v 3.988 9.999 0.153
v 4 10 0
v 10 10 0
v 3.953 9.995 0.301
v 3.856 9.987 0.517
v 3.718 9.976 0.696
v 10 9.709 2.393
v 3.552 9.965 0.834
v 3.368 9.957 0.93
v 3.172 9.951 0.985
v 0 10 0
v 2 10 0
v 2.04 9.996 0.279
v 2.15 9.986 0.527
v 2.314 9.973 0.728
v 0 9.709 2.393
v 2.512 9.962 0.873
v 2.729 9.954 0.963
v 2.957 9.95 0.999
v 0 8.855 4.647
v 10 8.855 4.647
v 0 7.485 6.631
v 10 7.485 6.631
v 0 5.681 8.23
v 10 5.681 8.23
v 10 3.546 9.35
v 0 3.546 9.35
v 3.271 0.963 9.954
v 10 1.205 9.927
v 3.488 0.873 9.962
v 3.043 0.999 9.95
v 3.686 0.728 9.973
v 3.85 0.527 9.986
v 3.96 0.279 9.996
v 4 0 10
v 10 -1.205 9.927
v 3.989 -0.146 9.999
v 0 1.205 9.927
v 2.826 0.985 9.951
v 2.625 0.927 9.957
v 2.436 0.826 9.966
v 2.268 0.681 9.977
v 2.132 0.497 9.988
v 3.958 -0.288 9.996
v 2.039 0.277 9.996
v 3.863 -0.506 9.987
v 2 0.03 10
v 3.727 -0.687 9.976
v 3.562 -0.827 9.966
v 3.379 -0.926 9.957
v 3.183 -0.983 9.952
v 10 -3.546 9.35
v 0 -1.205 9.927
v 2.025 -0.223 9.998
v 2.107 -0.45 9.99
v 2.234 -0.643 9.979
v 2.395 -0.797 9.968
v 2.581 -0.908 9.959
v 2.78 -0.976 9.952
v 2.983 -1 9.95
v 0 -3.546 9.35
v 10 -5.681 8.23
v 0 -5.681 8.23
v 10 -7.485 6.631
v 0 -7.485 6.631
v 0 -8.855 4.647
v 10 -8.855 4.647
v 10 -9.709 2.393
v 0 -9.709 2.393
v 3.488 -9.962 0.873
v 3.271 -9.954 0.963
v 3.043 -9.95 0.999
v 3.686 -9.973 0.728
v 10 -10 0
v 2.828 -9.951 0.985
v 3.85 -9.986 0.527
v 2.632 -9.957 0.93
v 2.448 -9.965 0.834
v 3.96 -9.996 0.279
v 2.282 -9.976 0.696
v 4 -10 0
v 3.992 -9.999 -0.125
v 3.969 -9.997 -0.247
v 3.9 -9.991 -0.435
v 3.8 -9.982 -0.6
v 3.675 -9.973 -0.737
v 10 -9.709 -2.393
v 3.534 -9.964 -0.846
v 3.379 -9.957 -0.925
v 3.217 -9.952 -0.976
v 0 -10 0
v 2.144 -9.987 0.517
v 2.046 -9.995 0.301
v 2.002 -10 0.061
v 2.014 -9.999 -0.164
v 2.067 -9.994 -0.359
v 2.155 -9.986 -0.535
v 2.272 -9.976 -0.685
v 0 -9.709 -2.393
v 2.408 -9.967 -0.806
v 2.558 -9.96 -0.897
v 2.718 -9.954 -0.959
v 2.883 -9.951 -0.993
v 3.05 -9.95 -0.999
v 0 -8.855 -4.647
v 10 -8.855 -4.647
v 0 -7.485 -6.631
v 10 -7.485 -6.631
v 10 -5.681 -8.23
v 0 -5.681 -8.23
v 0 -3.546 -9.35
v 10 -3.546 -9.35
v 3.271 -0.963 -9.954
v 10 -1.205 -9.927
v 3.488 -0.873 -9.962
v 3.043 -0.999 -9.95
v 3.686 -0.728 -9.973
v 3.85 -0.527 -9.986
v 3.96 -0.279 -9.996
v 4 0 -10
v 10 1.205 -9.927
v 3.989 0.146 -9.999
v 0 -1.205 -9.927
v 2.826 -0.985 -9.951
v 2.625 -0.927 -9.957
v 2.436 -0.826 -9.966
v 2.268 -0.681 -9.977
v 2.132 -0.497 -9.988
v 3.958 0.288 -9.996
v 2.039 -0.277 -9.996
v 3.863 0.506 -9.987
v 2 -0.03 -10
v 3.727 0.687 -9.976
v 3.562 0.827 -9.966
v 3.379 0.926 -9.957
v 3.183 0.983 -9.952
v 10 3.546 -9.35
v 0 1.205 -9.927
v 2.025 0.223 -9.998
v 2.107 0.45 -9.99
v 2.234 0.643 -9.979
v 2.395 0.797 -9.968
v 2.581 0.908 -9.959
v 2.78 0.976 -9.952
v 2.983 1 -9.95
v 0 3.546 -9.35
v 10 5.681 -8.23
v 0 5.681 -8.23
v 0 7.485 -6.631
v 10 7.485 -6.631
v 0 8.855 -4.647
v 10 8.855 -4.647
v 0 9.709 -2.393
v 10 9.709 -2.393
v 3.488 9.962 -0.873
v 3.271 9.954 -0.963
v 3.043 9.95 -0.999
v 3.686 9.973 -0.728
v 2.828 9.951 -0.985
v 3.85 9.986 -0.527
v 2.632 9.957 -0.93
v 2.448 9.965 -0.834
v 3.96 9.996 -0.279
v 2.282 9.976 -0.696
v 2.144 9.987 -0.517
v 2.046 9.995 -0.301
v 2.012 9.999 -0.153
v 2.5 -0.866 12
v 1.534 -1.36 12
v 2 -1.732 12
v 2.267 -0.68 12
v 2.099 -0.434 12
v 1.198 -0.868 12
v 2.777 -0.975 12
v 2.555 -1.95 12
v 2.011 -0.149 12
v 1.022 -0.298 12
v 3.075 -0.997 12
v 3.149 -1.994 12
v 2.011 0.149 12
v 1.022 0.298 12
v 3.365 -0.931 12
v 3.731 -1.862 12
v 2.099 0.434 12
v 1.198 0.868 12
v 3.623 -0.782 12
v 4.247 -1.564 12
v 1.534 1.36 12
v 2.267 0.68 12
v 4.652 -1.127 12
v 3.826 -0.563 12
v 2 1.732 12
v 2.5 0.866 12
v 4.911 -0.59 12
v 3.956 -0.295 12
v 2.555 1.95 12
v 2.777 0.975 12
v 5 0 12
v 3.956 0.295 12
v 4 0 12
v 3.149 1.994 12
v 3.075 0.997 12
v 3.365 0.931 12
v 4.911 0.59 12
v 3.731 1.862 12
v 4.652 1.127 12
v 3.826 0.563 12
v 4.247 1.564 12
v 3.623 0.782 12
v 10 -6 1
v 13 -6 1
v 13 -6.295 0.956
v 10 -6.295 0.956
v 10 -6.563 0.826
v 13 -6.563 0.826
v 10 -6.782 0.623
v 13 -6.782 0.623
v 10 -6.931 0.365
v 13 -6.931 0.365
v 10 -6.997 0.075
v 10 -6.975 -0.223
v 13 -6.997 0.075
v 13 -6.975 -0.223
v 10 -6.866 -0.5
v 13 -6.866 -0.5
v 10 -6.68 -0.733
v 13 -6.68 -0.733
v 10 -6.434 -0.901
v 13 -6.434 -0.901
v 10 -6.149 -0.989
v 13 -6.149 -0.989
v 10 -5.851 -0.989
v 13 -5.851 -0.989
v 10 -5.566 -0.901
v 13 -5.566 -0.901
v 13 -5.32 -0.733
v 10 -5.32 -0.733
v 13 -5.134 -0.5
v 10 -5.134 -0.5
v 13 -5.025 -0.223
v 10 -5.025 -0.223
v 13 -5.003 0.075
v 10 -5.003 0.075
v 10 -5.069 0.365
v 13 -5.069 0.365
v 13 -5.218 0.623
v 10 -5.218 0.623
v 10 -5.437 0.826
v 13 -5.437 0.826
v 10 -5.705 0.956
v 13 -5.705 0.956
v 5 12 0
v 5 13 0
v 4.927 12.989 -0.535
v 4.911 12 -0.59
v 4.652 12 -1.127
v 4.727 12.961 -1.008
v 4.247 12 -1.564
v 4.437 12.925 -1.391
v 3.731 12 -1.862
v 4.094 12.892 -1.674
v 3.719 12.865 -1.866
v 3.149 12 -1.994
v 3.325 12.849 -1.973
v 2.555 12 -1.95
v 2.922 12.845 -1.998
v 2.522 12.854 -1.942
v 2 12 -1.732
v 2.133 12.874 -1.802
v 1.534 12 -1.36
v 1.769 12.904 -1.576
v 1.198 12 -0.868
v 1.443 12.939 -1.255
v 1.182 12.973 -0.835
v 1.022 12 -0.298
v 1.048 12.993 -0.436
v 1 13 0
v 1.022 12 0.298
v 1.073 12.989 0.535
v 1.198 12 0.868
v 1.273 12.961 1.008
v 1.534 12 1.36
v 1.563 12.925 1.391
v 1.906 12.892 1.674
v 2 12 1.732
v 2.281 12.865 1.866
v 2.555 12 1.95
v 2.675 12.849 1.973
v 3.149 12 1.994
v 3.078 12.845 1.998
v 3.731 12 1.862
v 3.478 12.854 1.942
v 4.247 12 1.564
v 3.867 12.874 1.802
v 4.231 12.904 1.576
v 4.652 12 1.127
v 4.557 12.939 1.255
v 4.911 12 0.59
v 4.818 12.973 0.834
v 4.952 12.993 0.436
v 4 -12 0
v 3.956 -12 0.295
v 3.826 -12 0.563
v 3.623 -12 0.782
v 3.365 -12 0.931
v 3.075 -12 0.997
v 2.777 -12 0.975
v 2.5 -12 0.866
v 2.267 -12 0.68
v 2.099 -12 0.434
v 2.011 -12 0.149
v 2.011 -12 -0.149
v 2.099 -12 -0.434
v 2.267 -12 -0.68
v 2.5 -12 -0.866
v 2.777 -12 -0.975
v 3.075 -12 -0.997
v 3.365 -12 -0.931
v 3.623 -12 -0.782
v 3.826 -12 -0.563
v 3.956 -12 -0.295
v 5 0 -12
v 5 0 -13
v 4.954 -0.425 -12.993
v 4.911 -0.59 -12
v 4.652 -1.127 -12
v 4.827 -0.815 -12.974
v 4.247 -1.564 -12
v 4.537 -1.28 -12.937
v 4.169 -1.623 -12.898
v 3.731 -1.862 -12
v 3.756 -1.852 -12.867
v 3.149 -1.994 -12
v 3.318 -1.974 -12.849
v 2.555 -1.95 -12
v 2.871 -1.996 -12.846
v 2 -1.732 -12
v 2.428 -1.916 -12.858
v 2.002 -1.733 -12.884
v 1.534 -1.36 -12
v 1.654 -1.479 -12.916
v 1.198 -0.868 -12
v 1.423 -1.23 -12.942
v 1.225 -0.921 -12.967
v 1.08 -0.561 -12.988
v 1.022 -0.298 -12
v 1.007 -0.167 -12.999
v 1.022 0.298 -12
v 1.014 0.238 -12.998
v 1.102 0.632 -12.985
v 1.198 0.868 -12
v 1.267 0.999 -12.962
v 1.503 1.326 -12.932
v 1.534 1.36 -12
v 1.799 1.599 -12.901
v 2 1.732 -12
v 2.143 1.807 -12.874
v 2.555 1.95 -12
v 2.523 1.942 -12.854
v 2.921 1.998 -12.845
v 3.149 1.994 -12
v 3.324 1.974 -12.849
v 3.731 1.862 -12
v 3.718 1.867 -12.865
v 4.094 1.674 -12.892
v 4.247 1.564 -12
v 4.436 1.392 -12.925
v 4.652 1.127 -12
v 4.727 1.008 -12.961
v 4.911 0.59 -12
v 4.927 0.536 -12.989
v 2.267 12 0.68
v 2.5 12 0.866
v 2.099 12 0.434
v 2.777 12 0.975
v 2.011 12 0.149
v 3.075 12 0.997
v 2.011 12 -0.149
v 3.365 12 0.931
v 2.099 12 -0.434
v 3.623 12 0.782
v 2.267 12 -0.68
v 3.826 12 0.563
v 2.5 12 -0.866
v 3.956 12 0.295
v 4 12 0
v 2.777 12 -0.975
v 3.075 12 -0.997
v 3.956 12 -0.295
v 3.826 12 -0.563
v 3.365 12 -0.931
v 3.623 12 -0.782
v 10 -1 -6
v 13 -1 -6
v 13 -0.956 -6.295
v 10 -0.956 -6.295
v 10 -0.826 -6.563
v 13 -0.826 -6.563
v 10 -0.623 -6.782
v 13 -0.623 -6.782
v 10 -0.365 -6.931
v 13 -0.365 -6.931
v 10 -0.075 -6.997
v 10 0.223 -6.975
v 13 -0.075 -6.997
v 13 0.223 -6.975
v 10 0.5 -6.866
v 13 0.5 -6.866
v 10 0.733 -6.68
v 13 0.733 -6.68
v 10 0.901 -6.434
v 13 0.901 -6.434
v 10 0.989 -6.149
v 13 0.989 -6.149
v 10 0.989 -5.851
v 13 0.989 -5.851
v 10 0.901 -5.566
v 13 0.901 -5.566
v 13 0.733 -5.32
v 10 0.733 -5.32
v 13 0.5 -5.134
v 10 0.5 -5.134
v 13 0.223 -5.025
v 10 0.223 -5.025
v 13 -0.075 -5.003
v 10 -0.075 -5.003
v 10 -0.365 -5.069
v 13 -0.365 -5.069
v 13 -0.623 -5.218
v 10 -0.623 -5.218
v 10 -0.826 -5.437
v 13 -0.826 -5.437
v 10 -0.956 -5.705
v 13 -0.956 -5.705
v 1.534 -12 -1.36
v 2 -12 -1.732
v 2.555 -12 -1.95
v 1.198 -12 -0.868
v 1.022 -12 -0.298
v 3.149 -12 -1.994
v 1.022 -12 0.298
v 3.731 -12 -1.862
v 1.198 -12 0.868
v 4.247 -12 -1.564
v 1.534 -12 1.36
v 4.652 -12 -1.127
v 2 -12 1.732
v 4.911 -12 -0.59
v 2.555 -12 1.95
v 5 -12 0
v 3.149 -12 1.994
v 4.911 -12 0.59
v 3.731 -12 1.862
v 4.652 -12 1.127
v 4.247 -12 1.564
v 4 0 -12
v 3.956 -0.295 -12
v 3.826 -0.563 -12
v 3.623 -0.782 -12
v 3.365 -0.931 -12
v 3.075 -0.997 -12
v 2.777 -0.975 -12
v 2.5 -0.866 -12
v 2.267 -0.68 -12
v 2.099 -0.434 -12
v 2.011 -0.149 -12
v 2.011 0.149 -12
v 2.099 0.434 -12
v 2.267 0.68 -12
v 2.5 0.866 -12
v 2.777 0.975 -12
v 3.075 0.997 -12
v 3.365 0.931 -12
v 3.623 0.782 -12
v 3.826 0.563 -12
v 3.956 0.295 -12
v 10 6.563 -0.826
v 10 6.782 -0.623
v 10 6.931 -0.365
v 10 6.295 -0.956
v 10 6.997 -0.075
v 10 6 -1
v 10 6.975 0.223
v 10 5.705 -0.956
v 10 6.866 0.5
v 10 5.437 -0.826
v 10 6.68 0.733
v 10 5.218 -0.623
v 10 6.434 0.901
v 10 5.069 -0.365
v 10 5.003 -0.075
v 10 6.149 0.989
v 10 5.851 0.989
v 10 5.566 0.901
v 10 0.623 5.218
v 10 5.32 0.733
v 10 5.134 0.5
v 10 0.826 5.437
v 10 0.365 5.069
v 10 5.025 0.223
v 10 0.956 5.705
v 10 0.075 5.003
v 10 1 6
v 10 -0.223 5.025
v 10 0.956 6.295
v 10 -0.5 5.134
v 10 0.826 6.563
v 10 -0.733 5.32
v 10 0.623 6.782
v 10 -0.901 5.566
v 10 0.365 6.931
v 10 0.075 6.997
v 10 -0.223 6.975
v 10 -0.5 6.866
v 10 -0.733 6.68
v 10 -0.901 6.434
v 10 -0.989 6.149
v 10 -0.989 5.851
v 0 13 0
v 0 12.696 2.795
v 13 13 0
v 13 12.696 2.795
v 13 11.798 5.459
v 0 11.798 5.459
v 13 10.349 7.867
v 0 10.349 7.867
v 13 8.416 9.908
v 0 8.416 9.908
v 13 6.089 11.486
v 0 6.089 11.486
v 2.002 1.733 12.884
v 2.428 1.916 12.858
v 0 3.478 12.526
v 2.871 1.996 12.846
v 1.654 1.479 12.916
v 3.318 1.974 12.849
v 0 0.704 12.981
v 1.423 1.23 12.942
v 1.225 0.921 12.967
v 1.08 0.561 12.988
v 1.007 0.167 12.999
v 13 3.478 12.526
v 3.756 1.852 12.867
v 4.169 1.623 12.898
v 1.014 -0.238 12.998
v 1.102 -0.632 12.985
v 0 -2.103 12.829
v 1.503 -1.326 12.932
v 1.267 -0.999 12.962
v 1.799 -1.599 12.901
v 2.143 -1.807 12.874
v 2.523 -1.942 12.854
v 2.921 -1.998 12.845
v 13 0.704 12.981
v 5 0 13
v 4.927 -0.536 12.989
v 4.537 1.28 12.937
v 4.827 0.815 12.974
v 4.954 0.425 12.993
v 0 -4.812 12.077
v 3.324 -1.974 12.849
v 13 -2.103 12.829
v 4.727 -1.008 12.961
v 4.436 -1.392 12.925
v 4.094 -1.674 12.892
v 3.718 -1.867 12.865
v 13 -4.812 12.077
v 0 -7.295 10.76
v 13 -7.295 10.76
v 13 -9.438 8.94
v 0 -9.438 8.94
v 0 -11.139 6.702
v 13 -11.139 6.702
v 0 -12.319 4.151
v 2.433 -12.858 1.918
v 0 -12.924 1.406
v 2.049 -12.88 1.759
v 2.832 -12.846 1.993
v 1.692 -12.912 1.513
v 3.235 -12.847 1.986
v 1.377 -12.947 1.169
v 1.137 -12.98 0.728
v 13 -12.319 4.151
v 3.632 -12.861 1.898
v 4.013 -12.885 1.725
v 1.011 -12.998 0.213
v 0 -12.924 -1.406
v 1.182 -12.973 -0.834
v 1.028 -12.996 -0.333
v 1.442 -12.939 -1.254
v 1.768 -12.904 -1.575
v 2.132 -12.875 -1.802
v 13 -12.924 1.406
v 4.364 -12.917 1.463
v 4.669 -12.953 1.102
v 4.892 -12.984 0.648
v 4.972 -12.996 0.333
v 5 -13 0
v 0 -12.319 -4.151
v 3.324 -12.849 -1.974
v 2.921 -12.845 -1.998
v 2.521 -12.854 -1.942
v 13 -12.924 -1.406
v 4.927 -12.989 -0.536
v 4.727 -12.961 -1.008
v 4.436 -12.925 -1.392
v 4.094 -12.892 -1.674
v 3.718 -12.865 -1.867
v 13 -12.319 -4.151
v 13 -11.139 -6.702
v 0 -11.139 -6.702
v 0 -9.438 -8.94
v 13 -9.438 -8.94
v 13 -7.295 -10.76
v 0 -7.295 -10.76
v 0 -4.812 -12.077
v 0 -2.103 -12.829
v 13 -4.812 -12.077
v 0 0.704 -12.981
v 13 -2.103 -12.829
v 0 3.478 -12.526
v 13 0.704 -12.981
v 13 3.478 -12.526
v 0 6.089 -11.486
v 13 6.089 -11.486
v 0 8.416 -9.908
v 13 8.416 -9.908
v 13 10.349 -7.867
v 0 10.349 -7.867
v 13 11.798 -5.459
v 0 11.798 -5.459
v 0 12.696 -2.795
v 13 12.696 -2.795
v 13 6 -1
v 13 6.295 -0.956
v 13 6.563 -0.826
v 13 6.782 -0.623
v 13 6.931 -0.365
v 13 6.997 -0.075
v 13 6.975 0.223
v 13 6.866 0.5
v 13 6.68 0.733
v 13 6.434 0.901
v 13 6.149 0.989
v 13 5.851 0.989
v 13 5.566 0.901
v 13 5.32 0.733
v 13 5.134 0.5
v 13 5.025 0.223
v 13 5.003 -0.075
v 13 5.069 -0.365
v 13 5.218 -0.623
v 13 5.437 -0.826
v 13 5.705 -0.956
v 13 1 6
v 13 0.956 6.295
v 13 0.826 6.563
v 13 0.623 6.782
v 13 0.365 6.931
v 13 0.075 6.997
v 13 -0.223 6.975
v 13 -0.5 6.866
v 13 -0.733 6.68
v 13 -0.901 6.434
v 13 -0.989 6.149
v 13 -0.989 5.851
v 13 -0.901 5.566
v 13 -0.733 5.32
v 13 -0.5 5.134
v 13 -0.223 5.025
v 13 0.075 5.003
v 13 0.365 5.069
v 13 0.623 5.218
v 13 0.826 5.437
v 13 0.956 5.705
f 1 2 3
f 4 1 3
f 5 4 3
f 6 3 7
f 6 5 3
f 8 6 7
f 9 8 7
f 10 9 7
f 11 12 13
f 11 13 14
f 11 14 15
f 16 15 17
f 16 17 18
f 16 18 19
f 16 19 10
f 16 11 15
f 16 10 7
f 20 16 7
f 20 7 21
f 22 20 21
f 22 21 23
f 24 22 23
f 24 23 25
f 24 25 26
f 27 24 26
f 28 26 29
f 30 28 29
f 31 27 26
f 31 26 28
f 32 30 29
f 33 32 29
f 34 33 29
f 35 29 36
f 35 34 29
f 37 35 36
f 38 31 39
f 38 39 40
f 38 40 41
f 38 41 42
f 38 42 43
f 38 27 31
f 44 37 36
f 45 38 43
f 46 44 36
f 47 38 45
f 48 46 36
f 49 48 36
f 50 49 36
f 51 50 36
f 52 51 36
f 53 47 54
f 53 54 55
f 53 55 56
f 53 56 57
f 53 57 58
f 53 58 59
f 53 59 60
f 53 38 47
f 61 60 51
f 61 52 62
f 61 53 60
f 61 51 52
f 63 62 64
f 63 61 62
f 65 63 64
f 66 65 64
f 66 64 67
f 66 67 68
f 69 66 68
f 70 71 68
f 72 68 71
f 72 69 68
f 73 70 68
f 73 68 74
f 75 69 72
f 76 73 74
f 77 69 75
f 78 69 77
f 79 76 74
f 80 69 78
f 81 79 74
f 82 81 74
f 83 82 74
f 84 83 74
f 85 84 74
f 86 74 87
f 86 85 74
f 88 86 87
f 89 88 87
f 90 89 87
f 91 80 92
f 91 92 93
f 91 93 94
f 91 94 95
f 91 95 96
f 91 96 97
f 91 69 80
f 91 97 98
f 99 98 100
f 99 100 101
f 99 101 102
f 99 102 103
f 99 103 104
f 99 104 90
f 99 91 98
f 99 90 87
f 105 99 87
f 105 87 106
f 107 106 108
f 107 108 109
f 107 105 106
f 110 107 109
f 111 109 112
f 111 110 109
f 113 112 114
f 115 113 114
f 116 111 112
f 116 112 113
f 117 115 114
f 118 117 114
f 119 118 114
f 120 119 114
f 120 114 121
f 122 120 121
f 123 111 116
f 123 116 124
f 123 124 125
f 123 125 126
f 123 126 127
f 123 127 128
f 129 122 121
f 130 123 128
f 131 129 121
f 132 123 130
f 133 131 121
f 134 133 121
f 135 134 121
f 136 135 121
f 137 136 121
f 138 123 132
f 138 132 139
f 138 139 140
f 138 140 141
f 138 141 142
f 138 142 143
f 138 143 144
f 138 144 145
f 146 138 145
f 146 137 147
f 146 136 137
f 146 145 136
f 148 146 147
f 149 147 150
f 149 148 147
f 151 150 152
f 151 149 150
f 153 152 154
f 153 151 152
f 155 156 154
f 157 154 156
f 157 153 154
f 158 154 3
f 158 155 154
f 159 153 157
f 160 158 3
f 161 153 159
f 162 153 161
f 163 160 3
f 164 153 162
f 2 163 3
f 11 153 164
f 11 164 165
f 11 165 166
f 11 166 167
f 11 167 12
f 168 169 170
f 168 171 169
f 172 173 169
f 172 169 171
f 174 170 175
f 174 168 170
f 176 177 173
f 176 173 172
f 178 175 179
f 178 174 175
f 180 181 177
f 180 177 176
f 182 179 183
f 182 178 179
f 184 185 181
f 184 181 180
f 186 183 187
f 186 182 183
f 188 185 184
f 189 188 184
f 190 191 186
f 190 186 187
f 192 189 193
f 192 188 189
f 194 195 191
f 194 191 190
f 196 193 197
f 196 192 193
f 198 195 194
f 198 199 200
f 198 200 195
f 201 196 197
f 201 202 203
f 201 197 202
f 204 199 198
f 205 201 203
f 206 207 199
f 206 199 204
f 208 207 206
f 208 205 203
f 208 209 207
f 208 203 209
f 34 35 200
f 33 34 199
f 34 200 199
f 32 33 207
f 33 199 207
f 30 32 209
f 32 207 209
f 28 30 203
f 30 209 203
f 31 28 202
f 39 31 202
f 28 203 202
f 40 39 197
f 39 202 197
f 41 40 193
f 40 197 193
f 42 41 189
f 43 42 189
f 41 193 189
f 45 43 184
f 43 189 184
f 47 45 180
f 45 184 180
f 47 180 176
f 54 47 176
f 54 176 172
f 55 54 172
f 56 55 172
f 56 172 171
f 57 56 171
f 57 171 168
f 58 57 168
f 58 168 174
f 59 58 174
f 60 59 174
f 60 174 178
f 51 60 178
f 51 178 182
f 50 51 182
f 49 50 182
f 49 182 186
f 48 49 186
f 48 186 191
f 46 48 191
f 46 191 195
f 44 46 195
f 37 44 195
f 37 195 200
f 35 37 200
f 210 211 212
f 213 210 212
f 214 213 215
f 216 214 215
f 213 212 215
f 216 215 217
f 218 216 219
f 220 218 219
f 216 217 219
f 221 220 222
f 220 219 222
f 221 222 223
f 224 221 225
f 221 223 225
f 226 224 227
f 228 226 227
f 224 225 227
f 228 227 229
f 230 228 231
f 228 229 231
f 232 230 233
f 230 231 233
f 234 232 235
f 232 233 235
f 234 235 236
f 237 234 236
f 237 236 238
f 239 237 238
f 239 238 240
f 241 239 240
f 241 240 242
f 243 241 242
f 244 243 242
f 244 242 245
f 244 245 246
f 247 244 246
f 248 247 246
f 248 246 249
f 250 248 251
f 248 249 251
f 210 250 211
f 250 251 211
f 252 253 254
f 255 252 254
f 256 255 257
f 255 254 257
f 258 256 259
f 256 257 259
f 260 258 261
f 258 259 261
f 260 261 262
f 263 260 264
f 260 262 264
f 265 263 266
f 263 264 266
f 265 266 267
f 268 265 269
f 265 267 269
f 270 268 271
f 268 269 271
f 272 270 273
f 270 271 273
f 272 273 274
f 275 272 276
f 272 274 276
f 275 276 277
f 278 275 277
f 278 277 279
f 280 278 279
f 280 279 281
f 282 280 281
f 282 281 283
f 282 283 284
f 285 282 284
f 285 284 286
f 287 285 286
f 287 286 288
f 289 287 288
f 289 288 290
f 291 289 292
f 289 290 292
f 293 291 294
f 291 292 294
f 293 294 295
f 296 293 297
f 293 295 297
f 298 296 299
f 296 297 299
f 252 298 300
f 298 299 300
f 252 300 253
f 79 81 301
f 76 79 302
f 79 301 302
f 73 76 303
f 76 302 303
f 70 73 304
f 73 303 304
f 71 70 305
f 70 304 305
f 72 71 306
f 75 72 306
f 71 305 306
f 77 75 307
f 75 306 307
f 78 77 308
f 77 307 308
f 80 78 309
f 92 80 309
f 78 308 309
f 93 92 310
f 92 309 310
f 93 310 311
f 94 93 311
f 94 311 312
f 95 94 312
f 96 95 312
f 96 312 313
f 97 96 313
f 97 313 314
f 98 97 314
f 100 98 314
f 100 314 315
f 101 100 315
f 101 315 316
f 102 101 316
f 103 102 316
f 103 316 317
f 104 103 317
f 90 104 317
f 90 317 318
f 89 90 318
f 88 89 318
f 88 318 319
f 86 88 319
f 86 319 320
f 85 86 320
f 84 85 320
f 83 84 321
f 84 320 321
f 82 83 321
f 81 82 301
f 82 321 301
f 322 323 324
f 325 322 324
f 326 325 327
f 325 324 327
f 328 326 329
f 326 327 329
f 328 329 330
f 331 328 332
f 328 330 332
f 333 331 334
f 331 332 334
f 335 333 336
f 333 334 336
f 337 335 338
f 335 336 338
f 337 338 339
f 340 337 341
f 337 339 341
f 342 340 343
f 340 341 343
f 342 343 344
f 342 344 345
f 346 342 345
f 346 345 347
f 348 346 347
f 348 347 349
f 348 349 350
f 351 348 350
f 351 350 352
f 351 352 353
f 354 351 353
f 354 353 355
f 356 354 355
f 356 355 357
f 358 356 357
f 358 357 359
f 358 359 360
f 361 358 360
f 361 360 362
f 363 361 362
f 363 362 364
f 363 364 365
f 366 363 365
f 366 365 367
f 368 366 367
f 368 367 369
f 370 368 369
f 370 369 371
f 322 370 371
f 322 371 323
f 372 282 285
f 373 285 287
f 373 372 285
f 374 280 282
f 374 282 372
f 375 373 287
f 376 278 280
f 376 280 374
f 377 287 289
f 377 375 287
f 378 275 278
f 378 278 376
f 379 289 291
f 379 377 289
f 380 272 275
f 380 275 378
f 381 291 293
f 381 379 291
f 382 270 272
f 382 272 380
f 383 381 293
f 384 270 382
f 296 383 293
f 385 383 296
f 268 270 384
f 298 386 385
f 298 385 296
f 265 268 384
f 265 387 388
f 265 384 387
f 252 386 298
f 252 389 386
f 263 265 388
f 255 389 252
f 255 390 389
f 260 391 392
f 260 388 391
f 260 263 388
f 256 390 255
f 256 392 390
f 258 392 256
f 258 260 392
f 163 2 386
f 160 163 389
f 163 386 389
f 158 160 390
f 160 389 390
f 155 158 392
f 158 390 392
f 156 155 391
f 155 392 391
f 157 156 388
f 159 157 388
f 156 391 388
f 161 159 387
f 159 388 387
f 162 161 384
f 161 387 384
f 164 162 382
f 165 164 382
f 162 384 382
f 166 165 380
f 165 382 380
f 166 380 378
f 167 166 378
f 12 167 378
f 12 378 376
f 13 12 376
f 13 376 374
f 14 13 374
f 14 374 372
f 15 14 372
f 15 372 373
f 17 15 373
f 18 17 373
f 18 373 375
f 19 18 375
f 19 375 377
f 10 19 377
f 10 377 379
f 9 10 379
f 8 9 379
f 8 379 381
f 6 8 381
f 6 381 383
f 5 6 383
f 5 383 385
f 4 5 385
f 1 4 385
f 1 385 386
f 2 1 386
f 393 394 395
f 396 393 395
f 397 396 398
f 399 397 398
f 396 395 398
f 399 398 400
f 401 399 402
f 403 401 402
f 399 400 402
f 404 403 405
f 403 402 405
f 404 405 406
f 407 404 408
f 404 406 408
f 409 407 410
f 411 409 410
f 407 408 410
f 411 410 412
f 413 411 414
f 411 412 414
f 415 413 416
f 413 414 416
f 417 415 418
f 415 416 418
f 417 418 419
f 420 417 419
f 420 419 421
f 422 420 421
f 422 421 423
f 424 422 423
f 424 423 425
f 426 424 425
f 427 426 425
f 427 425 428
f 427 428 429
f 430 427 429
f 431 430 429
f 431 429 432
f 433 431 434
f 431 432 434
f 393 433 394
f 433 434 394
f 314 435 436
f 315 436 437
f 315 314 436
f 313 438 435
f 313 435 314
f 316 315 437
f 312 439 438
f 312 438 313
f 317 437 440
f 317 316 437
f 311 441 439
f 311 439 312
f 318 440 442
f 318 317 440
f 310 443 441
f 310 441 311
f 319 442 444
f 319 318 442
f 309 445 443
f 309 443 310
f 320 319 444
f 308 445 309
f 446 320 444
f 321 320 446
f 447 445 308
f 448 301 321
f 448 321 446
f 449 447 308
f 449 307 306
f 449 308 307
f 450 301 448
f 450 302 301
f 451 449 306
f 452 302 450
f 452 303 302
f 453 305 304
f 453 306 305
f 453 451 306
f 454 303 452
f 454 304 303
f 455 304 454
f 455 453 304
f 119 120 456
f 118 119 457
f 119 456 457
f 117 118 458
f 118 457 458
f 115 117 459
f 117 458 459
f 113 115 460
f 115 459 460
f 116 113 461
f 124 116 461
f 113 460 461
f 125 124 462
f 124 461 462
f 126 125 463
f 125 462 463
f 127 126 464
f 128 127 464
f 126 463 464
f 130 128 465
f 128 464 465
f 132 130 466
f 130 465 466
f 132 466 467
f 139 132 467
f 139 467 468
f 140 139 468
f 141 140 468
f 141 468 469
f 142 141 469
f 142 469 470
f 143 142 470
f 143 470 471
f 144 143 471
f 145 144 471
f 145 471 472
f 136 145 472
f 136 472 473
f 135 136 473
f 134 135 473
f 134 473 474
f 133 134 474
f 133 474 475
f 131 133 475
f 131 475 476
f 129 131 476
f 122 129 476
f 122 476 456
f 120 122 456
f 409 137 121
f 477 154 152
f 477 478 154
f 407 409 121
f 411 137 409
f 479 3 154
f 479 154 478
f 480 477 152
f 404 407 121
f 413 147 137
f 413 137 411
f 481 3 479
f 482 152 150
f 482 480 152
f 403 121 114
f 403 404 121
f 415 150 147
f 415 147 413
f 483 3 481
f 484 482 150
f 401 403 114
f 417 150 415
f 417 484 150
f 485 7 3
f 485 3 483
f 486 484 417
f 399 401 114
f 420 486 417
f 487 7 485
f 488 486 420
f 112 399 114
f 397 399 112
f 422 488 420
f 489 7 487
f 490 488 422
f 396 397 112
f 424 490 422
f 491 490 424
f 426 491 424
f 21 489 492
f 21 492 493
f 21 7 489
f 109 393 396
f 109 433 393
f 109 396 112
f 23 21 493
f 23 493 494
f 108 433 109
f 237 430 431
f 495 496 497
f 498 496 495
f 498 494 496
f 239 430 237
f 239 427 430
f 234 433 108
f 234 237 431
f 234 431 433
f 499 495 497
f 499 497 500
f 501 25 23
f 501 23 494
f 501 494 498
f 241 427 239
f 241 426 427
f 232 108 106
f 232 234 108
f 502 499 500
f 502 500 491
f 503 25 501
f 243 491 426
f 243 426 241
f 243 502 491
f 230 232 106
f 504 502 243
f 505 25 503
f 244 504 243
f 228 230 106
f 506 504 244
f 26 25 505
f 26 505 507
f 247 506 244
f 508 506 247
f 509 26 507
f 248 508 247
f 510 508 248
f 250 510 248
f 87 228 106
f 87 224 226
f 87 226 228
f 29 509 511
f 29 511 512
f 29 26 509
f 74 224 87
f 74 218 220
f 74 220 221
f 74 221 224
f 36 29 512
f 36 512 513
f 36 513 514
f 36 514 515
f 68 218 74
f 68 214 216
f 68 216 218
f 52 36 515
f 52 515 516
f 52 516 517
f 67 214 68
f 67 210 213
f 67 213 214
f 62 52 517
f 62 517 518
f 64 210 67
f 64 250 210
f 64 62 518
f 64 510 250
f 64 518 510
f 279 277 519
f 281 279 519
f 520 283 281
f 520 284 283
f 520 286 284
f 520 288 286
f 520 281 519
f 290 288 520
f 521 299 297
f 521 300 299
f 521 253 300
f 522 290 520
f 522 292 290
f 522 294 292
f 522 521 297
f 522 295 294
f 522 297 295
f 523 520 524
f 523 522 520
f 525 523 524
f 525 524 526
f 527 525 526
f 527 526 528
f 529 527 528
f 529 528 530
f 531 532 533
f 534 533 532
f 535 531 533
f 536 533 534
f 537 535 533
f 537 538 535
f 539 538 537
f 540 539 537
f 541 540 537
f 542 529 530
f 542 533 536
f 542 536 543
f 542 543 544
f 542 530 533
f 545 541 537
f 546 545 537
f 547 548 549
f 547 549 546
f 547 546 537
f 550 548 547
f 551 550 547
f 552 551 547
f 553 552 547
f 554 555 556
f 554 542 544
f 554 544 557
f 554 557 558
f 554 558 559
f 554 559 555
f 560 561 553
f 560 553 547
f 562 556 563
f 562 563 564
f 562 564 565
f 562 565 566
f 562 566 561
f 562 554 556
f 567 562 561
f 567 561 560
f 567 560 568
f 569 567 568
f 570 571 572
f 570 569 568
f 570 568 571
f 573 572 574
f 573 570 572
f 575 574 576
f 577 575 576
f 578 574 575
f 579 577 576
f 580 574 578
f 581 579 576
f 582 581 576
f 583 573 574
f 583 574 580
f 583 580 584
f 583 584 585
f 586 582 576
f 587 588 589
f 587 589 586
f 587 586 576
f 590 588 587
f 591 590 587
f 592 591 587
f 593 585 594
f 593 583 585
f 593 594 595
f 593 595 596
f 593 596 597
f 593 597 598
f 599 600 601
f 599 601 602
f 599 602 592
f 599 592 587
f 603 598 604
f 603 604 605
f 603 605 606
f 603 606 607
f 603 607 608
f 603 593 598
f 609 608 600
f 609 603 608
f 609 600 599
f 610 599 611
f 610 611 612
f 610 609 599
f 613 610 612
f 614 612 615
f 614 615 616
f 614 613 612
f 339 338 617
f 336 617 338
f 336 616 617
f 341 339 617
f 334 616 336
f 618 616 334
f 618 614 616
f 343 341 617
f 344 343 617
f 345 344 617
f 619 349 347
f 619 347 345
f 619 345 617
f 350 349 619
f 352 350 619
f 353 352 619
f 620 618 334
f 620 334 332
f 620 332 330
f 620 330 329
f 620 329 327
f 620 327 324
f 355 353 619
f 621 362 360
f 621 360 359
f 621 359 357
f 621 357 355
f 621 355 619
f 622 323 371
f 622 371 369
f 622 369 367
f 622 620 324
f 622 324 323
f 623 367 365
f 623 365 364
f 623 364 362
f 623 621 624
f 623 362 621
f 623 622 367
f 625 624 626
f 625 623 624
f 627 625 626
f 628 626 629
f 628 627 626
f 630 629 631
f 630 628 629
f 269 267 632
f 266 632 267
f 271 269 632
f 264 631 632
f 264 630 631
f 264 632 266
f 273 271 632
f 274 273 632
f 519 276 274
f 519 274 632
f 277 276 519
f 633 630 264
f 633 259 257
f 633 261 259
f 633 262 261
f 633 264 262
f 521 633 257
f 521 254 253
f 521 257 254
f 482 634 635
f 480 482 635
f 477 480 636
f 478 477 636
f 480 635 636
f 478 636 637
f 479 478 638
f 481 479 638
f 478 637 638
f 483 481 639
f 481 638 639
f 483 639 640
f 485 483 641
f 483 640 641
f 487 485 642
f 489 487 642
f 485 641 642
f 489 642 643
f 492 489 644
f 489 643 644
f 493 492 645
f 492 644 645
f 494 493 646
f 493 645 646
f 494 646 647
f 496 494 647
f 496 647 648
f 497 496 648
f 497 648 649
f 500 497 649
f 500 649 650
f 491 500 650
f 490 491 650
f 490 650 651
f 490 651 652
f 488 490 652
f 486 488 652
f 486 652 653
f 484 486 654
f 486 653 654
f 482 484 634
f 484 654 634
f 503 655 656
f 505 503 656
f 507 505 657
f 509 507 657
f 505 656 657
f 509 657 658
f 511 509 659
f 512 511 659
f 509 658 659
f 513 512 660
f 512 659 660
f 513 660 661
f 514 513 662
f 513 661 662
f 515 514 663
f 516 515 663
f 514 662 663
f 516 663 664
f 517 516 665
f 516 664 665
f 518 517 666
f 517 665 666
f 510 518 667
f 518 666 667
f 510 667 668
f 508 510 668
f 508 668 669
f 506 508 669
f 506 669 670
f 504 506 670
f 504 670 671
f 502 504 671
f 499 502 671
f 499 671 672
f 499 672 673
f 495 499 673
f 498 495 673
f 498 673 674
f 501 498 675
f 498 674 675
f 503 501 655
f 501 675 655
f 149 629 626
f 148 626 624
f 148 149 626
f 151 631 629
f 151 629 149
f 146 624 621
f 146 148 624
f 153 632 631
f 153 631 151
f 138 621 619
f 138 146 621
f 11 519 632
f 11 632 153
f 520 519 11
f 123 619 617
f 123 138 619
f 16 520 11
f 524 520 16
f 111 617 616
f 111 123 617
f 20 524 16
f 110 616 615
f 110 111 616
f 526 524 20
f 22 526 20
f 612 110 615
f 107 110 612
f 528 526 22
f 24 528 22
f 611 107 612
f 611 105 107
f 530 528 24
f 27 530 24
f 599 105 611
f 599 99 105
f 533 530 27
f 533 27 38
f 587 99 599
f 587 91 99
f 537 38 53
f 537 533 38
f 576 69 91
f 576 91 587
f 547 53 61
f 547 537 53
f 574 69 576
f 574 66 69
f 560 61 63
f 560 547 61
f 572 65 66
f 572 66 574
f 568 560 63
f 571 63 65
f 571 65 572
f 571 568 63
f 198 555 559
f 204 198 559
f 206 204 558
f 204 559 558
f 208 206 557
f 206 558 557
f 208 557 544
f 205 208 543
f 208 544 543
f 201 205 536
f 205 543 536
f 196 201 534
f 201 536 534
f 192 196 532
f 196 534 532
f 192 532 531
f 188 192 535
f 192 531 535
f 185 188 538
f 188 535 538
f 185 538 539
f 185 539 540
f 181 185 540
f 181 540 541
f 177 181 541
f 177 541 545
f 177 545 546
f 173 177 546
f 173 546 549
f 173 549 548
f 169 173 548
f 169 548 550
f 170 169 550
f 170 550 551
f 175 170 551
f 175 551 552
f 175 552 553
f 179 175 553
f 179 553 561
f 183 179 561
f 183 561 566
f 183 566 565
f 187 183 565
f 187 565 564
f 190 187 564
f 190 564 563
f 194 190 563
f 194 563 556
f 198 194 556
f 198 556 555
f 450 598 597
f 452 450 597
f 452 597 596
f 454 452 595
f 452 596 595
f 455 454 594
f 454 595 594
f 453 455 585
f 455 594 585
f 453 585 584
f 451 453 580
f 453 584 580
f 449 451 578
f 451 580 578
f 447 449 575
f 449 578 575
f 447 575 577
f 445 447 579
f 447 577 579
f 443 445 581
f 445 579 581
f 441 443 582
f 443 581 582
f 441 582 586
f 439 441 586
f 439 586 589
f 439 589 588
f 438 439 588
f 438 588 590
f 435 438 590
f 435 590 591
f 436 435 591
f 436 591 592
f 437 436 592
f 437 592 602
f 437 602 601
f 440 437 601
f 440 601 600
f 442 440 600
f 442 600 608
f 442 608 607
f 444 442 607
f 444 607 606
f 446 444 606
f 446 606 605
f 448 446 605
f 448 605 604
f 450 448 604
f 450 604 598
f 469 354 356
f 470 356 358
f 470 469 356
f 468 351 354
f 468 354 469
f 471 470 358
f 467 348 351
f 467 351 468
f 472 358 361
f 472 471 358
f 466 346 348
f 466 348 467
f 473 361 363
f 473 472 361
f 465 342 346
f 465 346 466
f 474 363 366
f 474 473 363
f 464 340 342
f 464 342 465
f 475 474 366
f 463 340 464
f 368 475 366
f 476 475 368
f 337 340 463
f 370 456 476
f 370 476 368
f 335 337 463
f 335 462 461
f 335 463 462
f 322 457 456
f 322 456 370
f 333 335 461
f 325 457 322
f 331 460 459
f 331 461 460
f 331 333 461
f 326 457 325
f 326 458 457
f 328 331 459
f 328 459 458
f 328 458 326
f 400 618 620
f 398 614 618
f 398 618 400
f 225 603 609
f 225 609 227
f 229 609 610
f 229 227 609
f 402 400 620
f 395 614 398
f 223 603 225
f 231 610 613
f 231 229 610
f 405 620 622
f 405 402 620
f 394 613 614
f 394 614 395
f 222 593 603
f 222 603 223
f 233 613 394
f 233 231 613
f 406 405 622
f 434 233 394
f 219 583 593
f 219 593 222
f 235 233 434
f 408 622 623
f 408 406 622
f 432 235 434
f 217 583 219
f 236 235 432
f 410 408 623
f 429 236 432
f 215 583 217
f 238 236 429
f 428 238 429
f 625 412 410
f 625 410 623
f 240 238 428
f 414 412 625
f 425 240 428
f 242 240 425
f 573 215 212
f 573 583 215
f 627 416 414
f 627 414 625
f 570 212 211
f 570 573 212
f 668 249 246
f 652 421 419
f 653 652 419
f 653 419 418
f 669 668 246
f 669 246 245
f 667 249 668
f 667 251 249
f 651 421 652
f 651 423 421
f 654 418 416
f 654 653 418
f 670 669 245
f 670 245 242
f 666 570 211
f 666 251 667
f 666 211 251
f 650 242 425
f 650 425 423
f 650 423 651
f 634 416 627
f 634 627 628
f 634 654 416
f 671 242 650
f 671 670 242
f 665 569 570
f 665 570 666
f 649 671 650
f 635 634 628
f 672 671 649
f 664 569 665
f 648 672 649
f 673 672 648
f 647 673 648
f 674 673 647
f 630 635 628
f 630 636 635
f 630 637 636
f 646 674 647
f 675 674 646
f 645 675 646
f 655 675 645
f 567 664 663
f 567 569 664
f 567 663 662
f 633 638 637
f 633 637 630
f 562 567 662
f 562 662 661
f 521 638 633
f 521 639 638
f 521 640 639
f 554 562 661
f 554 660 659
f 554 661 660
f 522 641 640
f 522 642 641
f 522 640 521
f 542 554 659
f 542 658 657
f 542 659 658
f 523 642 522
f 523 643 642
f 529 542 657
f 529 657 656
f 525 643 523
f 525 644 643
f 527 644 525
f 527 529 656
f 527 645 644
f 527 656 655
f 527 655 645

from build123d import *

# Parameters (mm, degrees)
CUT_EXTRUDE_1_REACH      = 24.517
SKETCH_2_R               = 1
PATTERN_CIRCULAR_1_COUNT = 4
SKETCH_5_R               = 1
CUT_EXTRUDE_2_DEPTH      = 10
PATTERN_CIRCULAR_3_COUNT = 4
SKETCH_7_R               = 2
CUT_EXTRUDE_3_DEPTH      = 1
PATTERN_CIRCULAR_4_COUNT = 4


with BuildPart() as part:
    # Эскиз1 → Повернуть1 (revolve)
    with BuildSketch(Plane.XY):
        Polygon((0, 13), (13, 13), (13, 0), (10, 0), (10, 10), (0, 10), align=None)
    revolve(axis=Axis((0, 0, 0), (1, 0, 0)))

    # Эскиз2 → Вырез-Вытянуть1 (cut, up to next)
    with BuildSketch(Plane(origin=(13, 0, 0), x_dir=(0, 0, -1), z_dir=(1, 0, 0)), mode=Mode.PRIVATE) as cut_extrude_1_sk1:
        with Locations((0, 6)):
            Circle(SKETCH_2_R)
    cut_extrude_1_tool1 = extrude(cut_extrude_1_sk1.sketch, amount=-CUT_EXTRUDE_1_REACH, mode=Mode.PRIVATE) & part.part
    cut_extrude_1 = cut_extrude_1_tool1.solids().sort_by_distance((13, 6, 0))[0]
    add(cut_extrude_1, mode=Mode.SUBTRACT)

    # Круговой массив1: Вырез-Вытянуть1 ×4 about axis
    pattern_circular_1_axis = Axis((10, 0, 0), (-1, 0, 0))
    for i in range(1, PATTERN_CIRCULAR_1_COUNT):
        add(cut_extrude_1.rotate(pattern_circular_1_axis, i * 360 / PATTERN_CIRCULAR_1_COUNT), mode=Mode.SUBTRACT)

    # Эскиз5 → Вырез-Вытянуть2 (cut)
    with BuildSketch(Plane.XY.offset(13)):
        with Locations((3, 0)):
            Circle(SKETCH_5_R)
    cut_extrude_2 = extrude(amount=-CUT_EXTRUDE_2_DEPTH, mode=Mode.SUBTRACT)

    # Круговой массив3: Вырез-Вытянуть2 ×4 about axis
    pattern_circular_3_axis = Axis((10, 0, 0), (-1, 0, 0))
    for i in range(1, PATTERN_CIRCULAR_3_COUNT):
        add(cut_extrude_2.rotate(pattern_circular_3_axis, i * 360 / PATTERN_CIRCULAR_3_COUNT), mode=Mode.SUBTRACT)

    # Эскиз7 → Вырез-Вытянуть3 (cut)
    with BuildSketch(Plane.XY.offset(13)):
        with Locations((3, 0)):
            Circle(SKETCH_7_R)
    cut_extrude_3 = extrude(amount=-CUT_EXTRUDE_3_DEPTH, mode=Mode.SUBTRACT)

    # Круговой массив4: Вырез-Вытянуть3 ×4 about axis
    pattern_circular_4_axis = Axis((10, 0, 0), (-1, 0, 0))
    for i in range(1, PATTERN_CIRCULAR_4_COUNT):
        add(cut_extrude_3.rotate(pattern_circular_4_axis, i * 360 / PATTERN_CIRCULAR_4_COUNT), mode=Mode.SUBTRACT)


solid = part.part
